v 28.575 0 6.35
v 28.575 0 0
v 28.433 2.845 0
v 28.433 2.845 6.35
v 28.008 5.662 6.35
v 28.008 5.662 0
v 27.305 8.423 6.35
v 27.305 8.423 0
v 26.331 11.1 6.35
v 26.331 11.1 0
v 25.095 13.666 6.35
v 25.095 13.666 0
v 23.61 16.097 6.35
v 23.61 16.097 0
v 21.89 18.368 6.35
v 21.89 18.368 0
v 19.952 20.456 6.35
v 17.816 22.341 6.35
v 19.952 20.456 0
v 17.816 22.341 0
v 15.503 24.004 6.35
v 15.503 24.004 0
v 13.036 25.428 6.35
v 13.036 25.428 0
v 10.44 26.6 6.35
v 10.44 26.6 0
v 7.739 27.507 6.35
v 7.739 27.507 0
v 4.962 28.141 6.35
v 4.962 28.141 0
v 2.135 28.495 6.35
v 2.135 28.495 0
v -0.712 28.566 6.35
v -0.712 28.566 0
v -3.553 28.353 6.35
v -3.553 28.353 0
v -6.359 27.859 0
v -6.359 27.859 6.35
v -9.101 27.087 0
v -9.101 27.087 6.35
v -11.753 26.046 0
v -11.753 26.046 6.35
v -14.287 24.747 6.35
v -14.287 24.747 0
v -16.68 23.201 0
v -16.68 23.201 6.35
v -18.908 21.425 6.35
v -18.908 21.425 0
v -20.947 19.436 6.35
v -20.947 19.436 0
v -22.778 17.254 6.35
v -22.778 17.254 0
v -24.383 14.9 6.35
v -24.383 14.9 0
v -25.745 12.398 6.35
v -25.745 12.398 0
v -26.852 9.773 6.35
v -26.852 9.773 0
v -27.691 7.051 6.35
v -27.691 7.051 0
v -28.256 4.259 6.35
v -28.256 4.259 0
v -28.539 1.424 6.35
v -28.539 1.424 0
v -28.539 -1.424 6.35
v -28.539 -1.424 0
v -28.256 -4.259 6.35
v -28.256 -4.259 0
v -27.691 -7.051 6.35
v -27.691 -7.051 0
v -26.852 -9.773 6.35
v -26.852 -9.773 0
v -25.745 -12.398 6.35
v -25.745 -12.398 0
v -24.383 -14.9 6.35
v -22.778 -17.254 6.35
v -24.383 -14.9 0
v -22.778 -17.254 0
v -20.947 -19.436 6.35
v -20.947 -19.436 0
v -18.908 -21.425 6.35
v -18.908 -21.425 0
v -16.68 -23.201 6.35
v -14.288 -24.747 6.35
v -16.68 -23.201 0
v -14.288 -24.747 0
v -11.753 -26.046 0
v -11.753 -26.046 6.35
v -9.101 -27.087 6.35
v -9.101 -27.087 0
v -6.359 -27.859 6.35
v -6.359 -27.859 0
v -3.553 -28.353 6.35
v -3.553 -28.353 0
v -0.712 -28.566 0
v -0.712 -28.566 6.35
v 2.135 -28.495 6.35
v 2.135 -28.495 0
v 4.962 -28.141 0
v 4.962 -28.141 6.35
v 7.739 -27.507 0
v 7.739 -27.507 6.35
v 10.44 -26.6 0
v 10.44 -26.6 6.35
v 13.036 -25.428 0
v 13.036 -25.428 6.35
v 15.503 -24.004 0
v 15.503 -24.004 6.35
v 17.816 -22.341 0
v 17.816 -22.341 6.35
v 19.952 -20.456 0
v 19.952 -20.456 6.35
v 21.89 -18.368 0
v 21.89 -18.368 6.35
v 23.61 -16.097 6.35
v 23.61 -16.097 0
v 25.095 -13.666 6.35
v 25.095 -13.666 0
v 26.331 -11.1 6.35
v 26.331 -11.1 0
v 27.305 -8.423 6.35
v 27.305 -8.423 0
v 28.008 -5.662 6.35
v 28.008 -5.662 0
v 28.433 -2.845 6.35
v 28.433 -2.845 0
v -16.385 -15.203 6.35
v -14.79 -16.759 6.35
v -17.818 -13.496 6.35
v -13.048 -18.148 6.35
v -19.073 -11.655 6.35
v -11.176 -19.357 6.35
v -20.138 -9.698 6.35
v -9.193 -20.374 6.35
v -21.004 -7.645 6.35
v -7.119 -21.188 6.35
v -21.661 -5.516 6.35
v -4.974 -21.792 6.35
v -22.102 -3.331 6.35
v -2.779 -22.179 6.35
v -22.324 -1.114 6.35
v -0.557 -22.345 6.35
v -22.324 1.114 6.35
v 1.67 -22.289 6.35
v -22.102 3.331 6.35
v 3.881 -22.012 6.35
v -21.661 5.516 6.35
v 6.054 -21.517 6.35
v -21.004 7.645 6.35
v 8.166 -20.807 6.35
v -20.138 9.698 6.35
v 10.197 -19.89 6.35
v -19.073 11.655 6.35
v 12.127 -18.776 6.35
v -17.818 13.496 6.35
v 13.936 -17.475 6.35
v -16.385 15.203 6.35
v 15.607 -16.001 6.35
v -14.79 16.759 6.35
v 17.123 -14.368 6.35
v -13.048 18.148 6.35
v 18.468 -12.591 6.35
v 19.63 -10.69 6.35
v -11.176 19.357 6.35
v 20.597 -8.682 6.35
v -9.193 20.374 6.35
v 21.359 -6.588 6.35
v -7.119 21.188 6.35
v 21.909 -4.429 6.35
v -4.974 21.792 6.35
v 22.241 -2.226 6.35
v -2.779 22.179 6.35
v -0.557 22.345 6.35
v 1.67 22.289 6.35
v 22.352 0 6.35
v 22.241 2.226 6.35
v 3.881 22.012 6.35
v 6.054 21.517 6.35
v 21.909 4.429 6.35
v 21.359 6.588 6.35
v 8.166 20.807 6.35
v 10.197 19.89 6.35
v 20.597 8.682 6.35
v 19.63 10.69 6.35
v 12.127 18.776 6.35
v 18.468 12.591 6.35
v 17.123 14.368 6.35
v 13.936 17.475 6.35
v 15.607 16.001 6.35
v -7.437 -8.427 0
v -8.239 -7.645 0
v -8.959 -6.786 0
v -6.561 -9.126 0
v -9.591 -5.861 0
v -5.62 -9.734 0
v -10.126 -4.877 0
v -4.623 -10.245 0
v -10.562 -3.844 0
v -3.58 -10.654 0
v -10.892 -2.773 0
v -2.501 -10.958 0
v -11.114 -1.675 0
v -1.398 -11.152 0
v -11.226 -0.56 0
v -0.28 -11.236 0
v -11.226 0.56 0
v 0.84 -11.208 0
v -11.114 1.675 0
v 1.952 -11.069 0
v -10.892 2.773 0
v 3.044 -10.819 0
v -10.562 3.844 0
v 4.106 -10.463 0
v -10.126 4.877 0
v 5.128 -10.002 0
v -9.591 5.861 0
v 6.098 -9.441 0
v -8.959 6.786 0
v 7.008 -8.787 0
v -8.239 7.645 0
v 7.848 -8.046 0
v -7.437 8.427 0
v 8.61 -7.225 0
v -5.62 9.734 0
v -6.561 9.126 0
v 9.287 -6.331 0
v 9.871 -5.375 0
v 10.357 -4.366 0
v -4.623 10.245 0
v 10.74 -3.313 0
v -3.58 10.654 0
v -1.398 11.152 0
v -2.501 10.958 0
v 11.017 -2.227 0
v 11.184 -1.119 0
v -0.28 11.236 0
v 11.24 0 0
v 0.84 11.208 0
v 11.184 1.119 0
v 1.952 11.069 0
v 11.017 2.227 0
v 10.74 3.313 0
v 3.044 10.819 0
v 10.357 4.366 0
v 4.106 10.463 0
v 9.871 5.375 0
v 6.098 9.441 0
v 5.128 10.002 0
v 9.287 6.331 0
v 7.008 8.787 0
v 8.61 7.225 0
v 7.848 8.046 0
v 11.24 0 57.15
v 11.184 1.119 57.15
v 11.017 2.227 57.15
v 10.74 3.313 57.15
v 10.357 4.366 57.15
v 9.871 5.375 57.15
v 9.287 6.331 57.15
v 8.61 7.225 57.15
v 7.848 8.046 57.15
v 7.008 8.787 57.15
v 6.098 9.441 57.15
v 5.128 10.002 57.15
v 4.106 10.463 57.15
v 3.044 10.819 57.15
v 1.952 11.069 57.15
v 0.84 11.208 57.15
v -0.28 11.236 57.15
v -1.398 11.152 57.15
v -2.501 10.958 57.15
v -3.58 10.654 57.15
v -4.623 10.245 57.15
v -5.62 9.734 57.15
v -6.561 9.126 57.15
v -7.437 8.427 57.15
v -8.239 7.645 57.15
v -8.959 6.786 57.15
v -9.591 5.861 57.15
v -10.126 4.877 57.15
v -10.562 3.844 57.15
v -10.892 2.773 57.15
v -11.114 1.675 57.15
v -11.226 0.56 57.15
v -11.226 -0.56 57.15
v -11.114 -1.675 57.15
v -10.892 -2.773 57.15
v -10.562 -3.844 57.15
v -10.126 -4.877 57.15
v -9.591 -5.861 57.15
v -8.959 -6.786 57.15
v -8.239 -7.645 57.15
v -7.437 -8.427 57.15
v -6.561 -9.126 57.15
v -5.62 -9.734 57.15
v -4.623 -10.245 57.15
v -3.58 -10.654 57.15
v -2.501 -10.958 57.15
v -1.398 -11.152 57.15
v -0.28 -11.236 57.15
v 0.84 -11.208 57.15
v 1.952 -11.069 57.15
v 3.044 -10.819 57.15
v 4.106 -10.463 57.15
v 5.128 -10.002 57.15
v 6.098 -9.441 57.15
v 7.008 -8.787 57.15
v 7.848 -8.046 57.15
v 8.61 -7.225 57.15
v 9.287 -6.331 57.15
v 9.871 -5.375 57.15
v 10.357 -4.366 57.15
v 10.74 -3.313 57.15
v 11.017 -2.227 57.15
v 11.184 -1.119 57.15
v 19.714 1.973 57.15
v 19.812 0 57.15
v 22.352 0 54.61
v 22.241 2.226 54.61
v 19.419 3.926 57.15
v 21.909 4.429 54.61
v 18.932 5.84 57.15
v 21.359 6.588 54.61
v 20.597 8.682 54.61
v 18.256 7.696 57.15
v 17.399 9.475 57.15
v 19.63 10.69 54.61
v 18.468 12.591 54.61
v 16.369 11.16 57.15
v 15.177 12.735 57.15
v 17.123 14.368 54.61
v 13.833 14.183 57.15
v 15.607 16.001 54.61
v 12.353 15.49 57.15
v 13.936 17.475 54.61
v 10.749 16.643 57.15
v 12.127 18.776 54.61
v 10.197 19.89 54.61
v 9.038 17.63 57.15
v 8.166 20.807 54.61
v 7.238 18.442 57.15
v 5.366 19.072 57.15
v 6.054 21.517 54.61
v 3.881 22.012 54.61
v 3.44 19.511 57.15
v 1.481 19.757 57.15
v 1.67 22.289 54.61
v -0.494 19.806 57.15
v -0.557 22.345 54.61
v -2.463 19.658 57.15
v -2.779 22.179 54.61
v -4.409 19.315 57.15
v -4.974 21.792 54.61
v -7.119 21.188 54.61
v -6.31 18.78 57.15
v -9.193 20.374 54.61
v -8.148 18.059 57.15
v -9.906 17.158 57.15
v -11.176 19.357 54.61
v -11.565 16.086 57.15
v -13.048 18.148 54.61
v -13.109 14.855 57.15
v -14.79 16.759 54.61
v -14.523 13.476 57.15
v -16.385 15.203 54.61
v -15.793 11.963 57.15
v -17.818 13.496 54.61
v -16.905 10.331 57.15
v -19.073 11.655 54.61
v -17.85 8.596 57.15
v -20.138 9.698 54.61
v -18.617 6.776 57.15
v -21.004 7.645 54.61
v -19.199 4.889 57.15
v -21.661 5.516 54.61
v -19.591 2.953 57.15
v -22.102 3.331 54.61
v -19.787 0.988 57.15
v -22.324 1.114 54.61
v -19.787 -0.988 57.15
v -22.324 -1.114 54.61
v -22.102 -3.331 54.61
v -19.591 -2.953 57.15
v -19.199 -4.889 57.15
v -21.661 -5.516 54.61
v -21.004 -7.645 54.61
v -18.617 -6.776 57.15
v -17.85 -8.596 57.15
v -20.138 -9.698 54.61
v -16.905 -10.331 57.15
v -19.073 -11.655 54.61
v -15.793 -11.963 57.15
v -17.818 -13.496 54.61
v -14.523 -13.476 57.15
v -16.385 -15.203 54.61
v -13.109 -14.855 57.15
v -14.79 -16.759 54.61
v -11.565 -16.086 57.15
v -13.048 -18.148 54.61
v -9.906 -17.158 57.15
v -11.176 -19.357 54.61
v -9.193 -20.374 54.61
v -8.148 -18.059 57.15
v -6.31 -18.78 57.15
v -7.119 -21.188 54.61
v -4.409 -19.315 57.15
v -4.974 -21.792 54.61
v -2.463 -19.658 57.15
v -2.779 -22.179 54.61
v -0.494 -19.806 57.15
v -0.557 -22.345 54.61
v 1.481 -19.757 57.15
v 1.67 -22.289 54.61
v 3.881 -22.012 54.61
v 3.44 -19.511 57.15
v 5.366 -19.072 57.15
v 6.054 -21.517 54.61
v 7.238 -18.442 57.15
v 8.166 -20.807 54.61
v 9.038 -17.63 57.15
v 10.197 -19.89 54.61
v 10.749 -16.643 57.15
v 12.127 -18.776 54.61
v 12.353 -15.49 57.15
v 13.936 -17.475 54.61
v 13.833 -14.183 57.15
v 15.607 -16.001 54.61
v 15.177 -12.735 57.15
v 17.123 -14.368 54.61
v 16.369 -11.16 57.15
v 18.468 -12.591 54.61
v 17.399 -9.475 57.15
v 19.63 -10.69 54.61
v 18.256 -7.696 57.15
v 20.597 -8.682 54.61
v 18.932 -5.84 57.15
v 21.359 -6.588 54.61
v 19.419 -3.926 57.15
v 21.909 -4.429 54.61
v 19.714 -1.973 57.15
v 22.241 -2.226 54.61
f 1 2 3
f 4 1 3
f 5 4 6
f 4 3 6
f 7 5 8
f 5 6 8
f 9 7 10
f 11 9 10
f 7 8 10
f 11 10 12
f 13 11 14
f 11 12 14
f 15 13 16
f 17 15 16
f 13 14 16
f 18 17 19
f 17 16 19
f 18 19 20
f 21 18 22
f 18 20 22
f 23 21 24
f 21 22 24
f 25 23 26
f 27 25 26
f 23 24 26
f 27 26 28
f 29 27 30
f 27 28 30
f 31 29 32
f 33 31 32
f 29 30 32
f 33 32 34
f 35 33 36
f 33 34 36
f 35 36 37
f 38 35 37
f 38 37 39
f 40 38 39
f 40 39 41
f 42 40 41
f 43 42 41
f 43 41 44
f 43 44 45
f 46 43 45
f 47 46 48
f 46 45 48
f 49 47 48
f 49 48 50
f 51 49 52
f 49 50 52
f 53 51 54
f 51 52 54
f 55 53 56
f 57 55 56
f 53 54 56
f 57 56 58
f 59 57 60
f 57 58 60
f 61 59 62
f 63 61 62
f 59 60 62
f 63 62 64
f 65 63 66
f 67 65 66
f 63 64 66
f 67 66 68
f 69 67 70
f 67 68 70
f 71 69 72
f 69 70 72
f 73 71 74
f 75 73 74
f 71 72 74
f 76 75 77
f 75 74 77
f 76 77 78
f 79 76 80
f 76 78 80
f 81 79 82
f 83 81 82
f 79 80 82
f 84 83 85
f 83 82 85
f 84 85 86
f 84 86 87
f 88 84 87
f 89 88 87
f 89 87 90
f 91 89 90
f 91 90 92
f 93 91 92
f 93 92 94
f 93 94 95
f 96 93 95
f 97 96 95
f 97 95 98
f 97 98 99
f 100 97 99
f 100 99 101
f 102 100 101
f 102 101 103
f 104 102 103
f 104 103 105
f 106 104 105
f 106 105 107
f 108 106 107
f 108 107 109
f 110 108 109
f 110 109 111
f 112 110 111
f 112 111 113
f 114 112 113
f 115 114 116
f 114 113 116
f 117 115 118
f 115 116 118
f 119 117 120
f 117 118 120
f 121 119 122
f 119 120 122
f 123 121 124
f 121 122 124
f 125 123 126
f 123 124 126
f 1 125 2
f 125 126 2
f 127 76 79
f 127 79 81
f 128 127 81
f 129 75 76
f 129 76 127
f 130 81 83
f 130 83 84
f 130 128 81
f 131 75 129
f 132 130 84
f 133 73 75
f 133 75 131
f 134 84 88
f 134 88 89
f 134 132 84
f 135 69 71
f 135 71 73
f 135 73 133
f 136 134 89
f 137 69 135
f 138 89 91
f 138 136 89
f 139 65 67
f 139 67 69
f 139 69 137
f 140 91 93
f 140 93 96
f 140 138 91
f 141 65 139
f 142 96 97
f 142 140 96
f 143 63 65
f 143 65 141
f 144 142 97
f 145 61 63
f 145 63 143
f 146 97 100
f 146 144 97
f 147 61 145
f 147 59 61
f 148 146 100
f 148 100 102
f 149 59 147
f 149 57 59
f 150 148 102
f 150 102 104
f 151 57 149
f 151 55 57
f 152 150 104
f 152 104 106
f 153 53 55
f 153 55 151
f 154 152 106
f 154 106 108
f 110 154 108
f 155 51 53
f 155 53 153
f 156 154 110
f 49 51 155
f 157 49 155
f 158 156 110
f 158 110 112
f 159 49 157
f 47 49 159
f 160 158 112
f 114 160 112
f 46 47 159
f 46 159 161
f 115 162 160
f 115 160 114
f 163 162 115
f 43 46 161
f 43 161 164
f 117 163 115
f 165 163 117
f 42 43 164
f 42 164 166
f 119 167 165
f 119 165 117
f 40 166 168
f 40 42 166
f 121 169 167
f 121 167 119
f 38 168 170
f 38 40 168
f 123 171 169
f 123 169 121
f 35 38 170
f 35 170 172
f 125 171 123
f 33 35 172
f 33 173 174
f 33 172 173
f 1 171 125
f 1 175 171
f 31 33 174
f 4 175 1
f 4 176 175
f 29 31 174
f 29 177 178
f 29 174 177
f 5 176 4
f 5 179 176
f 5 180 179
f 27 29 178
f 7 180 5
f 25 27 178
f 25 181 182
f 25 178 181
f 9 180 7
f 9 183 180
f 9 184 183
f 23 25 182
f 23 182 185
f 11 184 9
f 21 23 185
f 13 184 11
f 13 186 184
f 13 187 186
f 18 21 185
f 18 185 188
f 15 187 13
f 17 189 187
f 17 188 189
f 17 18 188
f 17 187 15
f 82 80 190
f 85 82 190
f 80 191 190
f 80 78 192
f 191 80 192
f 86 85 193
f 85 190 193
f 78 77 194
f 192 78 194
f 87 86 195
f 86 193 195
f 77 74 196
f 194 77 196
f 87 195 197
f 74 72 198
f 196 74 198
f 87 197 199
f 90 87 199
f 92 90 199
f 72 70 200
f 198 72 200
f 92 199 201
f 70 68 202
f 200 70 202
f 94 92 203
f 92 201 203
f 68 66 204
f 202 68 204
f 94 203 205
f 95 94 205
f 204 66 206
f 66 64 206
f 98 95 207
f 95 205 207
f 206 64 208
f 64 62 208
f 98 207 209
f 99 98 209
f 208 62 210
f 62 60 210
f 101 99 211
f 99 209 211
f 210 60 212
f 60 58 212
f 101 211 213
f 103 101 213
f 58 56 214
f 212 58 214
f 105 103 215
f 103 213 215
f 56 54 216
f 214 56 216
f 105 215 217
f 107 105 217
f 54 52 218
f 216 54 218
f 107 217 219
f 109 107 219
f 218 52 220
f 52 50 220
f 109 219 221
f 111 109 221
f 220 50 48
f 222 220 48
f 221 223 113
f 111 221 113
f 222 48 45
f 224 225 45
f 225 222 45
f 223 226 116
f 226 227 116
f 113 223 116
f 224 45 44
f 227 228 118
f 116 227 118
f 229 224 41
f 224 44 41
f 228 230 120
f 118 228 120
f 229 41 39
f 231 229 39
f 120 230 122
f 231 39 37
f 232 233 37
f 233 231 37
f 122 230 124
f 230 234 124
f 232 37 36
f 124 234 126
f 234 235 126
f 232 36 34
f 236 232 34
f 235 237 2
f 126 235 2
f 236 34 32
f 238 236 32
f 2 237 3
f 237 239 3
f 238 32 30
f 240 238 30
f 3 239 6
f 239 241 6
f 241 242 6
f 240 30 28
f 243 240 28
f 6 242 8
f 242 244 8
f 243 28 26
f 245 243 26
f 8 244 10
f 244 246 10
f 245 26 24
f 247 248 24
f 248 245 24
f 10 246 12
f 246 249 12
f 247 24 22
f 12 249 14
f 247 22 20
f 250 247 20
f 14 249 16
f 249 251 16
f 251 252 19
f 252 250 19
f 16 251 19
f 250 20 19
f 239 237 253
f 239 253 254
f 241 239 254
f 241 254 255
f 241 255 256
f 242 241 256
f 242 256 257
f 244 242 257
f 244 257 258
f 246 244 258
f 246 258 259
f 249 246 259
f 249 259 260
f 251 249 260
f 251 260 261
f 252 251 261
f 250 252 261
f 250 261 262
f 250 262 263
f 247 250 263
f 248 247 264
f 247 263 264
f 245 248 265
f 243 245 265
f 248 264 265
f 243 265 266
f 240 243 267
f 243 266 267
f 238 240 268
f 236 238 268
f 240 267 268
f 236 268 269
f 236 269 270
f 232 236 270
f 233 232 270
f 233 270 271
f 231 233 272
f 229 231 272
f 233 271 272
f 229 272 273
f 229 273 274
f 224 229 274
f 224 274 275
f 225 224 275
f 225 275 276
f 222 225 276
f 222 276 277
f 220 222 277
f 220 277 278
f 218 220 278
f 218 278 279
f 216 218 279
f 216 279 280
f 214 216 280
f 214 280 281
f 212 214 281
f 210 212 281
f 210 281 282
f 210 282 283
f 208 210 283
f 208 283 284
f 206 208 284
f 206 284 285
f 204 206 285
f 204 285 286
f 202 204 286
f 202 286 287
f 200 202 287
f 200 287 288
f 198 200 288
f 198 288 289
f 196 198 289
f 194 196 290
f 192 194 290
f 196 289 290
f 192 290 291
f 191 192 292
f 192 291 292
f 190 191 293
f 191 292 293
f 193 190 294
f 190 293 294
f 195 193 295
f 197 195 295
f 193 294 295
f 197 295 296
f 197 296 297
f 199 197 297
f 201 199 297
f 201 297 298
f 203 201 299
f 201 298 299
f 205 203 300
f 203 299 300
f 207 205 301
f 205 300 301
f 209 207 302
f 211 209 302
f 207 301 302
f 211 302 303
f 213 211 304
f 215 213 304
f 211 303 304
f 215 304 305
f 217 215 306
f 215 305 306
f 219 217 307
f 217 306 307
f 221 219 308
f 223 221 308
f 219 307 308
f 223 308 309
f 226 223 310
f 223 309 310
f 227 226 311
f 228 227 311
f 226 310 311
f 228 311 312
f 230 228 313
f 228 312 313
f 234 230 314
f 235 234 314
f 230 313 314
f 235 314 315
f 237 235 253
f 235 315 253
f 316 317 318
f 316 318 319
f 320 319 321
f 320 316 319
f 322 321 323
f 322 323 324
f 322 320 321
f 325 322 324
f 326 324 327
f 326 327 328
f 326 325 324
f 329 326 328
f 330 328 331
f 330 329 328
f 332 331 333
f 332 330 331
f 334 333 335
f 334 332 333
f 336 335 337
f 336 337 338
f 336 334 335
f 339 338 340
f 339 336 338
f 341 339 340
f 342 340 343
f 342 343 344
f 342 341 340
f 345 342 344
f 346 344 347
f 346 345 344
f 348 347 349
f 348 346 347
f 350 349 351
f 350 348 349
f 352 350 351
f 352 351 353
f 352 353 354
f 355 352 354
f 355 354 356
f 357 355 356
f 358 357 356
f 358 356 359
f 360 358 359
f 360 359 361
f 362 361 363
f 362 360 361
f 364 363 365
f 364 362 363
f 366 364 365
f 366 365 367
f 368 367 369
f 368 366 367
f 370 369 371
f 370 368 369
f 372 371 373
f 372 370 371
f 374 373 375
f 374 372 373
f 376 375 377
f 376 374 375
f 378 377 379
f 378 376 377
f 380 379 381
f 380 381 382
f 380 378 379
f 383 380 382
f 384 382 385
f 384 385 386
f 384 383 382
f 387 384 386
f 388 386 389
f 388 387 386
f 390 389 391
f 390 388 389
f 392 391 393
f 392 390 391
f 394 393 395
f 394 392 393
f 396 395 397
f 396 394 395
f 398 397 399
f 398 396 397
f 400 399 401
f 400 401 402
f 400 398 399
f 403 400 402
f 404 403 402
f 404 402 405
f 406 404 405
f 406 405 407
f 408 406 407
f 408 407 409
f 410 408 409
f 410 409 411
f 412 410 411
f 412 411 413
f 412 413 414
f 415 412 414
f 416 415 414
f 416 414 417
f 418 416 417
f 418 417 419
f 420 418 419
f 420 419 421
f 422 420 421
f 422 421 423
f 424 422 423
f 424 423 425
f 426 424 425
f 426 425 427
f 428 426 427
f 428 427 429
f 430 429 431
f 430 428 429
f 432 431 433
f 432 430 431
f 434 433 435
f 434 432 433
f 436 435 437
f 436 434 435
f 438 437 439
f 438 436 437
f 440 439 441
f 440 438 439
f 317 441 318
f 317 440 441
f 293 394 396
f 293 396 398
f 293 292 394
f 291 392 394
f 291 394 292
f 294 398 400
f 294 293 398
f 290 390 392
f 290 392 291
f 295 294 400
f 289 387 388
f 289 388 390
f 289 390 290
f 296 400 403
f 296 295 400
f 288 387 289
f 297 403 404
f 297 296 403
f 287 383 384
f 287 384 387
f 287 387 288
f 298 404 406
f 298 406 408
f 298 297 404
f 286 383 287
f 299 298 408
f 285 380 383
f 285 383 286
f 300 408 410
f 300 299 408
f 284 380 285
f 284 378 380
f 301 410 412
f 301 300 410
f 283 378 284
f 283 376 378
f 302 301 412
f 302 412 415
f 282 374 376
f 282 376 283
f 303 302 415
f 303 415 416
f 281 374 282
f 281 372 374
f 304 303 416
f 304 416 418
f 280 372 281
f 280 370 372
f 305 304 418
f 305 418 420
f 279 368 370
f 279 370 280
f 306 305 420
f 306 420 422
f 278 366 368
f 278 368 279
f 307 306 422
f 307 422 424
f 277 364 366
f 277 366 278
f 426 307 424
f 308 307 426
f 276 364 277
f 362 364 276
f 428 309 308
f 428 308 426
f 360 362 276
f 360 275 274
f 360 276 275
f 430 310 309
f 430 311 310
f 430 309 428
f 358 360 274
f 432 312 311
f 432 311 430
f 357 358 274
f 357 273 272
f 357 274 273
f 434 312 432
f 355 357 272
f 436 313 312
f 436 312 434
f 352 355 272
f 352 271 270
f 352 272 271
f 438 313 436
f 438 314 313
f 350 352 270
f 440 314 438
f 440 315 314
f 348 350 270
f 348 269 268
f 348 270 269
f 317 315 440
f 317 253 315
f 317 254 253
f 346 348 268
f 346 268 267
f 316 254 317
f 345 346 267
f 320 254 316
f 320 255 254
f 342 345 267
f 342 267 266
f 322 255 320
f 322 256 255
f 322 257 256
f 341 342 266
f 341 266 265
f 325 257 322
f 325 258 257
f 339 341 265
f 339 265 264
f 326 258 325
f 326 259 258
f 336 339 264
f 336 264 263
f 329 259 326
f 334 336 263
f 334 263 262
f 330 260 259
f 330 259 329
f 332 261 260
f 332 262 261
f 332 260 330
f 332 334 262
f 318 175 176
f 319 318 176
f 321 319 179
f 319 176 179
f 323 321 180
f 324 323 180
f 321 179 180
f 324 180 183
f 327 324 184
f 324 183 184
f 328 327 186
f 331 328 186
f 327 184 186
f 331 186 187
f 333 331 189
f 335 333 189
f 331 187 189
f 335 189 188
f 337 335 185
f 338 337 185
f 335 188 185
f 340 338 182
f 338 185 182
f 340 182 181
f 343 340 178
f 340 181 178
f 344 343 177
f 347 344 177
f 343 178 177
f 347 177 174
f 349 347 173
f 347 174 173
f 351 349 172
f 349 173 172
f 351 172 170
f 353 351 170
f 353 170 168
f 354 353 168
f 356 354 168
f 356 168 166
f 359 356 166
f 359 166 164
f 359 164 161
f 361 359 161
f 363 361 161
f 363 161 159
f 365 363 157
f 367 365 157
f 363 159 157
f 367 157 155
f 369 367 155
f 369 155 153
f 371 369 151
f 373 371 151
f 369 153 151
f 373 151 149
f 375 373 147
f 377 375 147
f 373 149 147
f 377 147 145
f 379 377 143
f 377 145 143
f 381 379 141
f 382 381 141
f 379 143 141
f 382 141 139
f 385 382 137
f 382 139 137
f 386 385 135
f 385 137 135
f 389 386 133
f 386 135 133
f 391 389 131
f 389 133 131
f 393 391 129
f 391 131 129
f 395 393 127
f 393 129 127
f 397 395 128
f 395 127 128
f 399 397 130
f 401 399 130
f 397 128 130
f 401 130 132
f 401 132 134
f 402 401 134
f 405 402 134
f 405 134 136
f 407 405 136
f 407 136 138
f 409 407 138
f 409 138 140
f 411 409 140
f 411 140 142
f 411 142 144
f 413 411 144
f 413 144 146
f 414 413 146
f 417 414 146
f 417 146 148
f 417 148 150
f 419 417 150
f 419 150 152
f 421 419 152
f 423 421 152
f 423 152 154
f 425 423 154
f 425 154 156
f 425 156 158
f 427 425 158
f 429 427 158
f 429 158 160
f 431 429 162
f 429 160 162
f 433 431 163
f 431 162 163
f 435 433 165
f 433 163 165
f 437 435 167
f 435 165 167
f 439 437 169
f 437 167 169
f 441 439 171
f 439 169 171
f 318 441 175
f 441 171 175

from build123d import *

# Parameters (mm, degrees)
F0_R     = 28.575
F1_DEPTH = 6.35
F2_R     = 22.352
F3_DEPTH = 50.8
F4_R     = 11.2395
F5_DEPTH = 57.151
F6_SIZE  = 2.54


with BuildPart() as f1:
    # F0 (on Top) → F1 (new body)
    with BuildSketch(Plane.XY):
        Circle(F0_R)
    extrude(amount=F1_DEPTH)

    # F2 (on face) → F3 (join)
    with BuildSketch(Plane.XY.offset(6.35)):
        Circle(F2_R)
    extrude(amount=F3_DEPTH)

    # F4 (on face) → F5 (cut, through all)
    with BuildSketch(Plane.XY.offset(57.15)):
        Circle(F4_R)
    extrude(amount=-F5_DEPTH, mode=Mode.SUBTRACT)

    # F6
    f6_edges = [f1.edges().sort_by_distance(p)[0] for p in [
        (-22.352, 0, 57.15),
    ]]
    chamfer(f6_edges, length=F6_SIZE)


solid = f1.part
